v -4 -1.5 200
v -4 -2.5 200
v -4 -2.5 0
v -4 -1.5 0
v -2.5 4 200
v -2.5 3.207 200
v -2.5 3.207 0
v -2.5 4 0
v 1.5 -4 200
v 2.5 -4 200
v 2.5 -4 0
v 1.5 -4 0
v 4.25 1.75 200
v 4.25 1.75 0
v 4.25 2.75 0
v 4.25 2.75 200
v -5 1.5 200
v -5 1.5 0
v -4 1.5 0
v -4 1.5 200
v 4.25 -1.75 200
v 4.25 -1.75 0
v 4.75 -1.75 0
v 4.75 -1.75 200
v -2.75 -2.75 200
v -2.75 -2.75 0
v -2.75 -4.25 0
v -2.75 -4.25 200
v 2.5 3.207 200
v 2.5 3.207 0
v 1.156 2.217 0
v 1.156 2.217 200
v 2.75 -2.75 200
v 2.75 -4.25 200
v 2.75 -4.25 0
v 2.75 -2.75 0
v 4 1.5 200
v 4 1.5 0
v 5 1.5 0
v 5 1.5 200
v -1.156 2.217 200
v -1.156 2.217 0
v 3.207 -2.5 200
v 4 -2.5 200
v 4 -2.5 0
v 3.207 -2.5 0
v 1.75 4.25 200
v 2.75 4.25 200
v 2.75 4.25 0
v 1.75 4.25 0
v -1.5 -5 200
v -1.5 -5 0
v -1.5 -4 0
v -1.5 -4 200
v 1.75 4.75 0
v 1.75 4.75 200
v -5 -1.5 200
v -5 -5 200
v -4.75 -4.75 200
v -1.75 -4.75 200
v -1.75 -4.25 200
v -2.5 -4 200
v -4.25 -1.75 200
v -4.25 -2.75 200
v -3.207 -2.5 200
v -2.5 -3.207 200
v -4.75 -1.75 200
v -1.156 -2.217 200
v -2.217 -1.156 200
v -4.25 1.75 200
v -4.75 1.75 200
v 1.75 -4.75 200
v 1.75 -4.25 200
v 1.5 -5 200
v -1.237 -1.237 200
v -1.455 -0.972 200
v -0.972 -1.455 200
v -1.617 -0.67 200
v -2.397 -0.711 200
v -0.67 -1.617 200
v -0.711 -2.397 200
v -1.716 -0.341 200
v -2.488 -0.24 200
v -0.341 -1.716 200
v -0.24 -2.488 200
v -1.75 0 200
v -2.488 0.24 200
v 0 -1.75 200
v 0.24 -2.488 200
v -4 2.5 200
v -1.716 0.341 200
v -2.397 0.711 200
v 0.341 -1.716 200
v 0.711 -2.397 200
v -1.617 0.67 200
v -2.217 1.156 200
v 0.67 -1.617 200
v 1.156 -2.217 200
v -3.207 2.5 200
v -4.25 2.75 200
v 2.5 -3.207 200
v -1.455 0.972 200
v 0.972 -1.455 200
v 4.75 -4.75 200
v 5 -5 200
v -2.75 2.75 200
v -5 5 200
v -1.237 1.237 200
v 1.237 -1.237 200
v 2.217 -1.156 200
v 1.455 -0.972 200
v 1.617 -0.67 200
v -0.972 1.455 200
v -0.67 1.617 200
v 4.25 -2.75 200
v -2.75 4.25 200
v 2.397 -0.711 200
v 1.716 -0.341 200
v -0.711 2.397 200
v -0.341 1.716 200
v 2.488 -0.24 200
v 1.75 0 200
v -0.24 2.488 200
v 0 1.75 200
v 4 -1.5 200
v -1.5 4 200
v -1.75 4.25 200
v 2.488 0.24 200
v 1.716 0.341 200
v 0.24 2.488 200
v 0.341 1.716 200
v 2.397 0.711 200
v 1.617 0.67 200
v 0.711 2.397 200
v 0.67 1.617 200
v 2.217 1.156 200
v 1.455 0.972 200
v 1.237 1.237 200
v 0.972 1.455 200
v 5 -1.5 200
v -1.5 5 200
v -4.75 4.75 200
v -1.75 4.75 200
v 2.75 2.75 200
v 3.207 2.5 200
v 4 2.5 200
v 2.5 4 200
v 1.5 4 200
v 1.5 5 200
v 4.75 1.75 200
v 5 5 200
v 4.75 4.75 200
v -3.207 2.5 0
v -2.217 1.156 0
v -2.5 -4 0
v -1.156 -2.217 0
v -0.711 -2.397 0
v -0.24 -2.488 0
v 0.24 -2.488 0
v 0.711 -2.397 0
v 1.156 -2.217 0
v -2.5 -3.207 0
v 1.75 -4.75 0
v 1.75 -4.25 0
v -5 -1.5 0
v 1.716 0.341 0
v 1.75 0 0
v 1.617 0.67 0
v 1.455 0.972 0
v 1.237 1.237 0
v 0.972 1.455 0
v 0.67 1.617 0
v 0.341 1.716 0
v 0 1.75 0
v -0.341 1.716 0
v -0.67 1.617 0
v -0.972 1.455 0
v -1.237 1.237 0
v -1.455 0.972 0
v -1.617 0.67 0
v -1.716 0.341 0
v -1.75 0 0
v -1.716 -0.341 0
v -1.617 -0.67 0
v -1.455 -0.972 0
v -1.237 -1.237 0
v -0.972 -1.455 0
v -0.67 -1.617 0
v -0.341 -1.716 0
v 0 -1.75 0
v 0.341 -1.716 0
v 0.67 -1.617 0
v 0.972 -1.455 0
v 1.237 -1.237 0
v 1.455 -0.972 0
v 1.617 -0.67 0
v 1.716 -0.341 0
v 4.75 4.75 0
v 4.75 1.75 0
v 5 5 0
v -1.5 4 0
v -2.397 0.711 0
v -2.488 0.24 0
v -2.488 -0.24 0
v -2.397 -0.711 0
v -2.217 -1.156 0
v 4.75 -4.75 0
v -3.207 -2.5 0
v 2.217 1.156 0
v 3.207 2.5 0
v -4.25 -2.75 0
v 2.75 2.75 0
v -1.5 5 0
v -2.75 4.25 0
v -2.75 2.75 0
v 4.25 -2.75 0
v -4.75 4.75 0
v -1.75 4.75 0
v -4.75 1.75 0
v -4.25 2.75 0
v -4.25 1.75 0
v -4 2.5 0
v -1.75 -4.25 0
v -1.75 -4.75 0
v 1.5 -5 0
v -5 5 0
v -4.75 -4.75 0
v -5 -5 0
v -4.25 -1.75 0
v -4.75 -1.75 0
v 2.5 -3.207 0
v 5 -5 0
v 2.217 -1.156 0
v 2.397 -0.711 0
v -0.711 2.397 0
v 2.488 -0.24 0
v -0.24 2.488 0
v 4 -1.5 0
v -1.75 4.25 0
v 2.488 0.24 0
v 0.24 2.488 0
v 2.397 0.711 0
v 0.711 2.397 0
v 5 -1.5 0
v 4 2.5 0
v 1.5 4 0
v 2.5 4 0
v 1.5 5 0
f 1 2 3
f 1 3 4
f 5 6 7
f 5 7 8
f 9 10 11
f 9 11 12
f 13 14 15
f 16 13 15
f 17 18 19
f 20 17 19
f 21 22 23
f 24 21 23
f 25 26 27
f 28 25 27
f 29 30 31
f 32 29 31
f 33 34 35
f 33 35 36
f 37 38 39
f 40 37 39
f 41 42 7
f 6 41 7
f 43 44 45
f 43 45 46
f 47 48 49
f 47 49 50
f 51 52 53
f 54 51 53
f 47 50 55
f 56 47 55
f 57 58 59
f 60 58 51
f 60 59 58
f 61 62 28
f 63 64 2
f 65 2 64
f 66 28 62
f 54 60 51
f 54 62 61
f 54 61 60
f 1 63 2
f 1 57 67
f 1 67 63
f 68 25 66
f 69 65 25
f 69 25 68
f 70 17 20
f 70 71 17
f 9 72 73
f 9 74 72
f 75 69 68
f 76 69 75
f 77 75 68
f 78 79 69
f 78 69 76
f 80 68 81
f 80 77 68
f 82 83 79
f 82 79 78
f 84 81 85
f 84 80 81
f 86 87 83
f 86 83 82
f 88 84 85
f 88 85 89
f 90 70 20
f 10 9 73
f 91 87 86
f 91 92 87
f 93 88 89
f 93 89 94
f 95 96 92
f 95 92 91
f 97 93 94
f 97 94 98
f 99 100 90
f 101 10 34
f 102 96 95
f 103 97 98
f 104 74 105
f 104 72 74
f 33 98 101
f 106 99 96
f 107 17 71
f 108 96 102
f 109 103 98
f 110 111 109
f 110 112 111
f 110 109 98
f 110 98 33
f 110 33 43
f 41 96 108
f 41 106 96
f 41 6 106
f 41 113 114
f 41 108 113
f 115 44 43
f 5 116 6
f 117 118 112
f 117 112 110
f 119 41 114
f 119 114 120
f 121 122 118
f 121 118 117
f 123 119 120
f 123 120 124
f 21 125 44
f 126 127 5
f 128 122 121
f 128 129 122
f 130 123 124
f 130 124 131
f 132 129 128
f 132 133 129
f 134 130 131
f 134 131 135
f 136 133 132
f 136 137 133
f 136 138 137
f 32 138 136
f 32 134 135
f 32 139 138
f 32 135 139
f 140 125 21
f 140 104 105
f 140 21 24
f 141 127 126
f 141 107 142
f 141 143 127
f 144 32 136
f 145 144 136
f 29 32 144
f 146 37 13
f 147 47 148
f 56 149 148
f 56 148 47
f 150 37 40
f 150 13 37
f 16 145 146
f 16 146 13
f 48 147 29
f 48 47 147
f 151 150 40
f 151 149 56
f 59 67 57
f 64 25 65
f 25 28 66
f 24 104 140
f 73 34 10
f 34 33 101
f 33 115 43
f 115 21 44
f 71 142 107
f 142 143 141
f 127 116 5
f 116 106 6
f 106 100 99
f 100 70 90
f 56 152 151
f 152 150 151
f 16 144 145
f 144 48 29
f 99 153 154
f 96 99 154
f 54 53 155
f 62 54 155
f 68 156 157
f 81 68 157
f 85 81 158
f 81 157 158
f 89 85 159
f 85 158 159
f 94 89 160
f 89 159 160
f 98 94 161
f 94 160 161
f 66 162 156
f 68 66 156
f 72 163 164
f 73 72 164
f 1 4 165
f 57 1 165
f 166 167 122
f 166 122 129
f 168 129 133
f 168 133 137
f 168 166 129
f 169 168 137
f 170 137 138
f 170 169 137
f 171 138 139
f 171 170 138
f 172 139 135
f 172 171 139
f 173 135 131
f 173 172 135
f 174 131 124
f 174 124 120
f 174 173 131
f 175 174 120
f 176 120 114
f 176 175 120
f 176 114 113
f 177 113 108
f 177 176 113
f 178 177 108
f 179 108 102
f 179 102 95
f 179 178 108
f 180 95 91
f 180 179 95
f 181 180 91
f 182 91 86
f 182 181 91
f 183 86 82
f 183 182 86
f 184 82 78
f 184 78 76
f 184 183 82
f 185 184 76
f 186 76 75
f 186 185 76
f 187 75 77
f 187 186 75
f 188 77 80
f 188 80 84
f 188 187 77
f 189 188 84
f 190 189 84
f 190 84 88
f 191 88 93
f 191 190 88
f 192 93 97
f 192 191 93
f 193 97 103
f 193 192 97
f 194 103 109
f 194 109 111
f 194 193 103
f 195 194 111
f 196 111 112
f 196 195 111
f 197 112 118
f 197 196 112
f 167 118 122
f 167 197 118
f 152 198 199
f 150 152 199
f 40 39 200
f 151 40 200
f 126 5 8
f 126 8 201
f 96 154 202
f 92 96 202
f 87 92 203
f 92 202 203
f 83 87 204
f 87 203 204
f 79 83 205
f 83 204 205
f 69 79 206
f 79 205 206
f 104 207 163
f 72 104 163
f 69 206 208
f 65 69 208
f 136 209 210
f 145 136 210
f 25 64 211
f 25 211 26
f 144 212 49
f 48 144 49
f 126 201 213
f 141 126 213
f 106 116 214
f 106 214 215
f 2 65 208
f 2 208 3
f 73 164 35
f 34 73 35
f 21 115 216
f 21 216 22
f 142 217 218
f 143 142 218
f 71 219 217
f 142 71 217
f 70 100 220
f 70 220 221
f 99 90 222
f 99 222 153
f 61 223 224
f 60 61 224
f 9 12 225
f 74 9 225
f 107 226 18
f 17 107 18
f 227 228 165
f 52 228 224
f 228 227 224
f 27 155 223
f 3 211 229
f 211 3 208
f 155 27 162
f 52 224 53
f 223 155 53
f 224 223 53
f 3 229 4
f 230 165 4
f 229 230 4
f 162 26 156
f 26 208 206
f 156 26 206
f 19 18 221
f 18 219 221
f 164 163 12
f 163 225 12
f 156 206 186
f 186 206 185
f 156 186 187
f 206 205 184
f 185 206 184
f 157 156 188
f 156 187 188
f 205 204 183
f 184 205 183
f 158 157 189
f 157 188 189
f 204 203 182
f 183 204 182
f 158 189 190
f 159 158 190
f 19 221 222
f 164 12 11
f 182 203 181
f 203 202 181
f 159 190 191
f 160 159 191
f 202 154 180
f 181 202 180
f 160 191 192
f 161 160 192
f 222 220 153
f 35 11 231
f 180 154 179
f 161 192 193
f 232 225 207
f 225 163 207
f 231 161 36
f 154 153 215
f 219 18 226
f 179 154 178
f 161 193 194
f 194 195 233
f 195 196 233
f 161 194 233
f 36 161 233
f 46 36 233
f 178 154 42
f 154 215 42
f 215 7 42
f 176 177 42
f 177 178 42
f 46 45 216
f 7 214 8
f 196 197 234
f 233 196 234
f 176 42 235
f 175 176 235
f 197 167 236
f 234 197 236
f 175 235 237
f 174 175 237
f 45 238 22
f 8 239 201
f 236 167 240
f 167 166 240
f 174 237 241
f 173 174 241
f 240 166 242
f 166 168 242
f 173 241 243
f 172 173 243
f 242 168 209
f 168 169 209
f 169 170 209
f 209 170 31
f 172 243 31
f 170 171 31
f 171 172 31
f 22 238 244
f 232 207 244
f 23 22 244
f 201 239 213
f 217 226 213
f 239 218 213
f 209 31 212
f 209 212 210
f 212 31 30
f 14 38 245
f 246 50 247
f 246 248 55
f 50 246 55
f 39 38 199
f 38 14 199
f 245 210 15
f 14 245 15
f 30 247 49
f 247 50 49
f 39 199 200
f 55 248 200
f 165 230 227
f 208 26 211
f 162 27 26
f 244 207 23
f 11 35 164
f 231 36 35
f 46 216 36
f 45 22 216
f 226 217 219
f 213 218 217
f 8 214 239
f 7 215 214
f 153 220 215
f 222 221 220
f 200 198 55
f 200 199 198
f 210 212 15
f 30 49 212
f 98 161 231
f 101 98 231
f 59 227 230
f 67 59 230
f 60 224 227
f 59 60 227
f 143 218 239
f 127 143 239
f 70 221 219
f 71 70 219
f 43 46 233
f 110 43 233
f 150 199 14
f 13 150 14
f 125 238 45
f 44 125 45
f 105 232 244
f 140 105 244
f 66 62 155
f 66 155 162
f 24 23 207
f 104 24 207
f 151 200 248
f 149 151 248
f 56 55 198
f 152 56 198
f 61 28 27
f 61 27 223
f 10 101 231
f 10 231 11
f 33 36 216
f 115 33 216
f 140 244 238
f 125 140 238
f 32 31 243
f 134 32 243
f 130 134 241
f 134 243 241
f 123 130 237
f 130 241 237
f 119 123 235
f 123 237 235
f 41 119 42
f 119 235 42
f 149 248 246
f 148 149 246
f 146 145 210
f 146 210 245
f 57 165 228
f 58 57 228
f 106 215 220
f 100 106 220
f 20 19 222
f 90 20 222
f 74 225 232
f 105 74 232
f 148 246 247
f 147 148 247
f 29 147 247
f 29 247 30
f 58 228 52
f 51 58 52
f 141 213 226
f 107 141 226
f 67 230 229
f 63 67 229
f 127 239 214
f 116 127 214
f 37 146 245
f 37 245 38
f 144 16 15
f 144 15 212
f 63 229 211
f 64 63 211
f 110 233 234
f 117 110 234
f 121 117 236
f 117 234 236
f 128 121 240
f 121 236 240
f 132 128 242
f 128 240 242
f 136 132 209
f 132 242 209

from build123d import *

# Parameters (mm, degrees)
ESQUISSE1_R        = 1.75
BOSS_EXTRU_1_DEPTH = 200


with BuildPart() as part:
    # Esquisse1 → Boss.-Extru.1 (new body)
    with BuildSketch(Plane.XY):
        with BuildLine():
            Line((-1.5, 5), (-5, 5))
            Line((-5, 5), (-5, 1.5))
            Line((-5, 1.5), (-4, 1.5))
            Line((-4, 1.5), (-4, 2.5))
            Line((-4, 2.5), (-3.207106781, 2.5))
            Line((-3.207106781, 2.5), (-2.216672281, 1.15601211))
            ThreePointArc((-2.216672281, 1.15601211), (-2.5, 0), (-2.216672281, -1.15601211))
            Line((-2.216672281, -1.15601211), (-3.207106781, -2.5))
            Line((-3.207106781, -2.5), (-4, -2.5))
            Line((-4, -2.5), (-4, -1.5))
            Line((-4, -1.5), (-5, -1.5))
            Line((-5, -1.5), (-5, -5))
            Line((-5, -5), (-1.5, -5))
            Line((-1.5, -5), (-1.5, -4))
            Line((-1.5, -4), (-2.5, -4))
            Line((-2.5, -4), (-2.5, -3.207106781))
            Line((-2.5, -3.207106781), (-1.15601211, -2.216672281))
            ThreePointArc((-1.15601211, -2.216672281), (0, -2.5), (1.15601211, -2.216672281))
            Line((1.15601211, -2.216672281), (2.5, -3.207106781))
            Line((2.5, -3.207106781), (2.5, -4))
            Line((2.5, -4), (1.5, -4))
            Line((1.5, -4), (1.5, -5))
            Line((1.5, -5), (5, -5))
            Line((5, -5), (5, -1.5))
            Line((5, -1.5), (4, -1.5))
            Line((4, -1.5), (4, -2.5))
            Line((4, -2.5), (3.207106781, -2.5))
            Line((3.207106781, -2.5), (2.216672281, -1.15601211))
            ThreePointArc((2.216672281, -1.15601211), (2.5, 0), (2.216672281, 1.15601211))
            Line((2.216672281, 1.15601211), (3.207106781, 2.5))
            Line((3.207106781, 2.5), (4, 2.5))
            Line((4, 2.5), (4, 1.5))
            Line((4, 1.5), (5, 1.5))
            Line((5, 1.5), (5, 5))
            Line((5, 5), (1.5, 5))
            Line((1.5, 5), (1.5, 4))
            Line((1.5, 4), (2.5, 4))
            Line((2.5, 4), (2.5, 3.207106781))
            Line((2.5, 3.207106781), (1.15601211, 2.216672281))
            ThreePointArc((1.15601211, 2.216672281), (0, 2.5), (-1.15601211, 2.216672281))
            Line((-1.15601211, 2.216672281), (-2.5, 3.207106781))
            Line((-2.5, 3.207106781), (-2.5, 4))
            Line((-2.5, 4), (-1.5, 4))
            Line((-1.5, 4), (-1.5, 5))
        make_face()
        Polygon((-4.75, 1.75), (-4.75, 4.75), (-1.75, 4.75), (-1.75, 4.25), (-2.75, 4.25), (-2.75, 2.75), (-4.25, 2.75), (-4.25, 1.75), align=None, mode=Mode.SUBTRACT)
        Circle(ESQUISSE1_R, mode=Mode.SUBTRACT)
        Polygon((-4.75, -4.75), (-4.75, -1.75), (-4.25, -1.75), (-4.25, -2.75), (-2.75, -2.75), (-2.75, -4.25), (-1.75, -4.25), (-1.75, -4.75), align=None, mode=Mode.SUBTRACT)
        Polygon((4.75, 4.75), (4.75, 1.75), (4.25, 1.75), (4.25, 2.75), (2.75, 2.75), (2.75, 4.25), (1.75, 4.25), (1.75, 4.75), align=None, mode=Mode.SUBTRACT)
        Polygon((4.75, -4.75), (1.75, -4.75), (1.75, -4.25), (2.75, -4.25), (2.75, -2.75), (4.25, -2.75), (4.25, -1.75), (4.75, -1.75), align=None, mode=Mode.SUBTRACT)
    extrude(amount=BOSS_EXTRU_1_DEPTH)


solid = part.part
